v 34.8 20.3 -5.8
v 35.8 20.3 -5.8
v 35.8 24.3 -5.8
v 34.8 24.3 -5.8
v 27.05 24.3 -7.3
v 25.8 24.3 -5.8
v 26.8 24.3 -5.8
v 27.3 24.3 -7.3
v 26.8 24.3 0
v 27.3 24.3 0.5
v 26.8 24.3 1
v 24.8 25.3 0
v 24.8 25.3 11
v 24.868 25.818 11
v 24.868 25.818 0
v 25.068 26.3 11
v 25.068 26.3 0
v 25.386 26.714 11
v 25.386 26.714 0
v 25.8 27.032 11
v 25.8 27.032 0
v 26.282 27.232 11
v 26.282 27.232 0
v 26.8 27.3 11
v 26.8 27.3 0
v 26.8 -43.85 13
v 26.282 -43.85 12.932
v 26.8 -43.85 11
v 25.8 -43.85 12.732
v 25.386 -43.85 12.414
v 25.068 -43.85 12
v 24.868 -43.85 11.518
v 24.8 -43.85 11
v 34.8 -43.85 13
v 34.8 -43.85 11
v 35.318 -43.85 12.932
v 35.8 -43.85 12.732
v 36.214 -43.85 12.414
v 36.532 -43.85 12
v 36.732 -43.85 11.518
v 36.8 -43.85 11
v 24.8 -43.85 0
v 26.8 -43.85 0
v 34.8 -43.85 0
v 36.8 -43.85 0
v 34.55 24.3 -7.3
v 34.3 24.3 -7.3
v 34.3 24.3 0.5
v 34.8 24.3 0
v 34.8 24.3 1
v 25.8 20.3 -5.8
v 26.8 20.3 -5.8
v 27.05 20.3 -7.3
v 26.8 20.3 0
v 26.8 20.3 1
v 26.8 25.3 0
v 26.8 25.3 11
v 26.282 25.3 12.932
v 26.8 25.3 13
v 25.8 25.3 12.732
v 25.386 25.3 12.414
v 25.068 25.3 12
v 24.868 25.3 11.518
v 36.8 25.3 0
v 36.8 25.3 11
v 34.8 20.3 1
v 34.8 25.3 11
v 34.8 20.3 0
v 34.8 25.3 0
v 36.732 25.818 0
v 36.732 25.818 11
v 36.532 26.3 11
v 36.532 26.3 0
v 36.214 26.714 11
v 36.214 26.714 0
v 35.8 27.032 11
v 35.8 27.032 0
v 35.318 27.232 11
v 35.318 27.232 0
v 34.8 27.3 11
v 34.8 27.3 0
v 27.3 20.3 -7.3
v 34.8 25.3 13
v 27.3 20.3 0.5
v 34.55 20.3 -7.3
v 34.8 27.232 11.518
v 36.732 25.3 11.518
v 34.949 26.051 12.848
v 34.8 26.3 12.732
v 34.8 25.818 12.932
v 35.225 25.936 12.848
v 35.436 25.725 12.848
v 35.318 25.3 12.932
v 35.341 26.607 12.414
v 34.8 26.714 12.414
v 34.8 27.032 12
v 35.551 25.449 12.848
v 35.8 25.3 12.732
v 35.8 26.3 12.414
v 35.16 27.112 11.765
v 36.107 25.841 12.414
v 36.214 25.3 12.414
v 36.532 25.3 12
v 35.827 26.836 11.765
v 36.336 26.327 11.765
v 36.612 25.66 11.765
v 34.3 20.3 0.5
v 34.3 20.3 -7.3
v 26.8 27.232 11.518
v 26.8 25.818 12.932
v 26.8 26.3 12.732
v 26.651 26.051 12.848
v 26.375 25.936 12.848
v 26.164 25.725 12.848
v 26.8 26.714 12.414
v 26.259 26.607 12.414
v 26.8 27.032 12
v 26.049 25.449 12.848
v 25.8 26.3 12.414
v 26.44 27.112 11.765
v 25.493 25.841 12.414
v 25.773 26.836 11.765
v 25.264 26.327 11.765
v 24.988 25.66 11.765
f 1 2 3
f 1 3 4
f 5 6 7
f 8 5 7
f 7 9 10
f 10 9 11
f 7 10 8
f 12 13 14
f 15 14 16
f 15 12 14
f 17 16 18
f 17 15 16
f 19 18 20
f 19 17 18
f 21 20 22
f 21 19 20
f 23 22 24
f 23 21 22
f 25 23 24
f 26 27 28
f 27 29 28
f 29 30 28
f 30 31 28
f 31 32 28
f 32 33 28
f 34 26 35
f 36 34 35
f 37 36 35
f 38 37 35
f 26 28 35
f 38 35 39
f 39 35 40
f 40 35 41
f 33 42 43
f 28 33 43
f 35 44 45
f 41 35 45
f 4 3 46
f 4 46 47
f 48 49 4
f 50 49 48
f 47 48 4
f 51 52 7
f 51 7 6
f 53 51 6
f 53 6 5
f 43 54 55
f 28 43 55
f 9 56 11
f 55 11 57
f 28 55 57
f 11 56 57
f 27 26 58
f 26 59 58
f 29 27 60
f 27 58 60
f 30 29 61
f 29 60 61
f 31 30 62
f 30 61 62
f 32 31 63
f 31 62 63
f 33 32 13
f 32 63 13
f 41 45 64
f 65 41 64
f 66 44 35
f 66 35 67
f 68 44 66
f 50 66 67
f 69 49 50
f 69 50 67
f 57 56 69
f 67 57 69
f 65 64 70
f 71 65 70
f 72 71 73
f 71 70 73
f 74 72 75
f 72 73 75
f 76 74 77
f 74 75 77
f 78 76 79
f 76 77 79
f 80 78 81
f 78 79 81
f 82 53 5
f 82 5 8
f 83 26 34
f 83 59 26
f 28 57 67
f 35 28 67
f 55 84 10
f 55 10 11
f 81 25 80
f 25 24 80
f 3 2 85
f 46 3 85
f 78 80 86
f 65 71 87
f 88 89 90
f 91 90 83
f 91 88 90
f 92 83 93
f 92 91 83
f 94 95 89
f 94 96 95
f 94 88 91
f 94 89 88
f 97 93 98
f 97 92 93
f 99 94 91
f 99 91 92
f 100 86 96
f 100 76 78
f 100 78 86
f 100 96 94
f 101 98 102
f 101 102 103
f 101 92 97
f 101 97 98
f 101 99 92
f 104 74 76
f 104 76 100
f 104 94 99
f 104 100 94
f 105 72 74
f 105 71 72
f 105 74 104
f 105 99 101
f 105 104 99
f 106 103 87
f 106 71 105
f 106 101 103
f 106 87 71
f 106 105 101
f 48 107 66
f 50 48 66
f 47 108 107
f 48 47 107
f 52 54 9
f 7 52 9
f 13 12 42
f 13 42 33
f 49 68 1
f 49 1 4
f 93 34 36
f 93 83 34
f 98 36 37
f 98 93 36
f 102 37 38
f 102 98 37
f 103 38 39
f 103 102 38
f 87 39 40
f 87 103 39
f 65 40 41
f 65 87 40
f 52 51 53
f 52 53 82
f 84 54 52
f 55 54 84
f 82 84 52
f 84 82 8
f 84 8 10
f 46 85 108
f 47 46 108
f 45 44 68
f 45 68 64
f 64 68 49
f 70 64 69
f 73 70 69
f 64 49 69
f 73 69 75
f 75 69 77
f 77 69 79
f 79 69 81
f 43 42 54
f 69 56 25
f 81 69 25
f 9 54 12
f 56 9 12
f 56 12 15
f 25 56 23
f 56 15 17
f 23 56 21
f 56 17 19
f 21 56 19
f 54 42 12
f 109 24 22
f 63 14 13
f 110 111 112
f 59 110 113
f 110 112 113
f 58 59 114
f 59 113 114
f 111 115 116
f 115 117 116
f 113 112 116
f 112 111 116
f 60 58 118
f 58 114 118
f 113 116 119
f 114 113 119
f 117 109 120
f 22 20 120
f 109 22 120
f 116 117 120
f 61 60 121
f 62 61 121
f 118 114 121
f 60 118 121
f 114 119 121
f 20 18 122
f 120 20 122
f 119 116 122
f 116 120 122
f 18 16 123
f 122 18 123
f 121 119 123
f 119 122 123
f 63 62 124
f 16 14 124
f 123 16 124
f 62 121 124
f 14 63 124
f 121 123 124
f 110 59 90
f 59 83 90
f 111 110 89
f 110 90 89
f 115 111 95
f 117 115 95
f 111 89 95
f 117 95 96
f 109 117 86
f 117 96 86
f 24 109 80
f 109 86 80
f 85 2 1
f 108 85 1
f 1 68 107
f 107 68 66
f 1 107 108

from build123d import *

# Parameters (mm, degrees)
BOSS_EXTRUDE1_DEPTH    = 11
SKETCH2_W              = 2
SKETCH2_H              = 6
BOSS_EXTRUDE2_DEPTH    = 2
SKETCH1_3_W            = 2
SKETCH1_3_H            = 100
BOSS_EXTRUDE3_DEPTH    = 11
SKETCH3_W              = 12
SKETCH3_H              = 100
BOSS_EXTRUDE4_DEPTH    = 2
SKETCH10_W             = 12
SKETCH10_H             = 28.85
CUT_EXTRUDE3_DEPTH     = 14
SKETCH11_W             = 12
SKETCH11_H             = 13
BOSS_EXTRUDE8_DEPTH    = 2
SKETCH12_W             = 8
SKETCH12_H             = 11
CUT_EXTRUDE4_DEPTH     = 2
SKETCH17_W             = 13
SKETCH17_H             = 16.3
CUT_EXTRUDE7_DEPTH     = 26.8
SKETCH18_W             = 11
SKETCH18_H             = 6
BOSS_EXTRUDE11_DEPTH   = 2
SKETCH19_W             = 8
SKETCH19_H             = 11
BOSS_EXTRUDE12_DEPTH   = 2
FILLET8_R              = 2
SKETCH20_W             = 0.5
SKETCH20_H             = 4
BOSS_EXTRUDE13_DEPTH   = 5.8
BOSS_EXTRUDE13_2_DEPTH = 5.8
BOSS_EXTRUDE14_DEPTH   = 4


with BuildPart() as part:
    # Sketch1 → Boss-Extrude1 (new body)
    with BuildSketch(Plane.XY):
        Polygon((24.8, 14.3), (-2, 14.3), (-2, -2), (24.8, -2), (24.8, 3.15), (22.8, 3.15), (22.8, 0), (0, 0), (0, 12.3), (22.8, 12.3), (22.8, 9.15), (24.8, 9.15), align=None)
    extrude(amount=BOSS_EXTRUDE1_DEPTH)

    # Sketch2 → Boss-Extrude2 (add)
    with BuildSketch(Plane.XY.offset(11)):
        Polygon((22.8, 9.15), (22.8, 3.15), (22.8, 0), (0, 0), (0, 12.3), (22.8, 12.3), align=None)
        Polygon((24.8, -2), (24.8, 3.15), (22.8, 3.15), (22.8, 0), (0, 0), (0, 12.3), (22.8, 12.3), (22.8, 9.15), (24.8, 9.15), (24.8, 14.3), (-2, 14.3), (-2, -2), align=None)
        with Locations((23.8, 6.15)):
            Rectangle(SKETCH2_W, SKETCH2_H)
    extrude(amount=BOSS_EXTRUDE2_DEPTH)

    # Sketch1_3 → Boss-Extrude3 (add)
    with BuildSketch(Plane.XY):
        Polygon((24.8, 3.15), (24.8, -2), (24.8, -43.85), (26.8, -43.85), (26.8, 3.15), align=None)
        Polygon((24.8, 56.15), (24.8, 14.3), (24.8, 9.15), (26.8, 9.15), (26.8, 56.15), align=None)
        with Locations((35.8, 6.15)):
            Rectangle(SKETCH1_3_W, SKETCH1_3_H)
    extrude(amount=BOSS_EXTRUDE3_DEPTH)

    # Sketch3 → Boss-Extrude4 (add)
    with BuildSketch(Plane.XY.offset(11)):
        with Locations((30.8, 6.15)):
            Rectangle(SKETCH3_W, SKETCH3_H)
    extrude(amount=BOSS_EXTRUDE4_DEPTH)

    # Sketch10 → Cut-Extrude3 (cut, through all)
    with BuildSketch(Plane.XY.offset(13)):
        with Locations((30.8, 41.725)):
            Rectangle(SKETCH10_W, SKETCH10_H)
    extrude(amount=-CUT_EXTRUDE3_DEPTH, mode=Mode.SUBTRACT)

    # Sketch11 → Boss-Extrude8 (add)
    with BuildSketch(Plane(origin=(0, 27.3, 0), x_dir=(1, 0, 0), z_dir=(0, 1, 0))):
        with Locations((30.8, -6.5)):
            Rectangle(SKETCH11_W, SKETCH11_H)
    extrude(amount=-BOSS_EXTRUDE8_DEPTH)

    # Sketch12 → Cut-Extrude4 (cut)
    with BuildSketch(Plane.XY.offset(13)):
        with Locations((30.8, 19.8)):
            Rectangle(SKETCH12_W, SKETCH12_H)
    extrude(amount=-CUT_EXTRUDE4_DEPTH, mode=Mode.SUBTRACT)

    # Sketch17 → Cut-Extrude7 (cut)
    with BuildSketch(Plane.ZY.offset(2)):
        with Locations((6.5, 6.15)):
            Rectangle(SKETCH17_W, SKETCH17_H)
    extrude(amount=-CUT_EXTRUDE7_DEPTH, mode=Mode.SUBTRACT)

    # Sketch18 → Boss-Extrude11 (add)
    with BuildSketch(Plane.ZY.offset(-24.8)):
        with Locations((5.5, 6.15)):
            Rectangle(SKETCH18_W, SKETCH18_H)
    extrude(amount=-BOSS_EXTRUDE11_DEPTH)

    # Sketch19 → Boss-Extrude12 (add)
    with BuildSketch(Plane.XY.offset(13)):
        with Locations((30.8, 19.8)):
            Rectangle(SKETCH19_W, SKETCH19_H)
    extrude(amount=-BOSS_EXTRUDE12_DEPTH)

    # Fillet8
    fillet8_edges = [part.edges().sort_by_distance(p)[0] for p in [
        (36.8, 27.3, 6.5),
        (24.8, 27.3, 6.5),
        (30.8, 27.3, 13),
        (24.8, -8.275, 13),
        (36.8, -8.275, 13),
    ]]
    fillet(fillet8_edges, radius=FILLET8_R)



with BuildPart() as body_2:
    # Sketch20 → Boss-Extrude13 (new body)
    with BuildSketch(Plane(origin=(0, 0, 0), x_dir=(-1, 0, 0), z_dir=(0, 0, -1))):
        with Locations((-34.55, 22.3)):
            Rectangle(SKETCH20_W, SKETCH20_H)
    extrude(amount=BOSS_EXTRUDE13_DEPTH)


with BuildPart() as body_3:
    # Sketch20 → Boss-Extrude13 2 (new body)
    with BuildSketch(Plane(origin=(0, 0, 0), x_dir=(-1, 0, 0), z_dir=(0, 0, -1))):
        with Locations((-27.05, 22.3)):
            Rectangle(SKETCH20_W, SKETCH20_H)
    extrude(amount=BOSS_EXTRUDE13_2_DEPTH)


with BuildPart() as part_1:
    add(part.part)

    add(body_2.part)  # Boss-Extrude14 merges body 2

    add(body_3.part)  # Boss-Extrude14 merges body 3
    # Sketch21 → Boss-Extrude14 (add)
    with BuildSketch(Plane.XZ.offset(-20.3)):
        Polygon((27.3, 0.5), (26.8, 1), (26.8, 0.5), (26.8, 0), (27.3, 0), align=None)
        Polygon((26.8, -5.8), (25.8, -5.8), (27.05, -7.3), (27.3, -7.3), (27.3, -5.8), align=None)
        Polygon((34.3, -5.8), (34.8, -5.8), (35.8, -5.8), (34.55, -7.3), (34.3, -7.3), align=None)
        Polygon((34.8, 0), (34.3, 0), (34.3, 0.5), (34.8, 1), (34.8, 0.5), align=None)
    extrude(amount=-BOSS_EXTRUDE14_DEPTH)


solid = part_1.part
